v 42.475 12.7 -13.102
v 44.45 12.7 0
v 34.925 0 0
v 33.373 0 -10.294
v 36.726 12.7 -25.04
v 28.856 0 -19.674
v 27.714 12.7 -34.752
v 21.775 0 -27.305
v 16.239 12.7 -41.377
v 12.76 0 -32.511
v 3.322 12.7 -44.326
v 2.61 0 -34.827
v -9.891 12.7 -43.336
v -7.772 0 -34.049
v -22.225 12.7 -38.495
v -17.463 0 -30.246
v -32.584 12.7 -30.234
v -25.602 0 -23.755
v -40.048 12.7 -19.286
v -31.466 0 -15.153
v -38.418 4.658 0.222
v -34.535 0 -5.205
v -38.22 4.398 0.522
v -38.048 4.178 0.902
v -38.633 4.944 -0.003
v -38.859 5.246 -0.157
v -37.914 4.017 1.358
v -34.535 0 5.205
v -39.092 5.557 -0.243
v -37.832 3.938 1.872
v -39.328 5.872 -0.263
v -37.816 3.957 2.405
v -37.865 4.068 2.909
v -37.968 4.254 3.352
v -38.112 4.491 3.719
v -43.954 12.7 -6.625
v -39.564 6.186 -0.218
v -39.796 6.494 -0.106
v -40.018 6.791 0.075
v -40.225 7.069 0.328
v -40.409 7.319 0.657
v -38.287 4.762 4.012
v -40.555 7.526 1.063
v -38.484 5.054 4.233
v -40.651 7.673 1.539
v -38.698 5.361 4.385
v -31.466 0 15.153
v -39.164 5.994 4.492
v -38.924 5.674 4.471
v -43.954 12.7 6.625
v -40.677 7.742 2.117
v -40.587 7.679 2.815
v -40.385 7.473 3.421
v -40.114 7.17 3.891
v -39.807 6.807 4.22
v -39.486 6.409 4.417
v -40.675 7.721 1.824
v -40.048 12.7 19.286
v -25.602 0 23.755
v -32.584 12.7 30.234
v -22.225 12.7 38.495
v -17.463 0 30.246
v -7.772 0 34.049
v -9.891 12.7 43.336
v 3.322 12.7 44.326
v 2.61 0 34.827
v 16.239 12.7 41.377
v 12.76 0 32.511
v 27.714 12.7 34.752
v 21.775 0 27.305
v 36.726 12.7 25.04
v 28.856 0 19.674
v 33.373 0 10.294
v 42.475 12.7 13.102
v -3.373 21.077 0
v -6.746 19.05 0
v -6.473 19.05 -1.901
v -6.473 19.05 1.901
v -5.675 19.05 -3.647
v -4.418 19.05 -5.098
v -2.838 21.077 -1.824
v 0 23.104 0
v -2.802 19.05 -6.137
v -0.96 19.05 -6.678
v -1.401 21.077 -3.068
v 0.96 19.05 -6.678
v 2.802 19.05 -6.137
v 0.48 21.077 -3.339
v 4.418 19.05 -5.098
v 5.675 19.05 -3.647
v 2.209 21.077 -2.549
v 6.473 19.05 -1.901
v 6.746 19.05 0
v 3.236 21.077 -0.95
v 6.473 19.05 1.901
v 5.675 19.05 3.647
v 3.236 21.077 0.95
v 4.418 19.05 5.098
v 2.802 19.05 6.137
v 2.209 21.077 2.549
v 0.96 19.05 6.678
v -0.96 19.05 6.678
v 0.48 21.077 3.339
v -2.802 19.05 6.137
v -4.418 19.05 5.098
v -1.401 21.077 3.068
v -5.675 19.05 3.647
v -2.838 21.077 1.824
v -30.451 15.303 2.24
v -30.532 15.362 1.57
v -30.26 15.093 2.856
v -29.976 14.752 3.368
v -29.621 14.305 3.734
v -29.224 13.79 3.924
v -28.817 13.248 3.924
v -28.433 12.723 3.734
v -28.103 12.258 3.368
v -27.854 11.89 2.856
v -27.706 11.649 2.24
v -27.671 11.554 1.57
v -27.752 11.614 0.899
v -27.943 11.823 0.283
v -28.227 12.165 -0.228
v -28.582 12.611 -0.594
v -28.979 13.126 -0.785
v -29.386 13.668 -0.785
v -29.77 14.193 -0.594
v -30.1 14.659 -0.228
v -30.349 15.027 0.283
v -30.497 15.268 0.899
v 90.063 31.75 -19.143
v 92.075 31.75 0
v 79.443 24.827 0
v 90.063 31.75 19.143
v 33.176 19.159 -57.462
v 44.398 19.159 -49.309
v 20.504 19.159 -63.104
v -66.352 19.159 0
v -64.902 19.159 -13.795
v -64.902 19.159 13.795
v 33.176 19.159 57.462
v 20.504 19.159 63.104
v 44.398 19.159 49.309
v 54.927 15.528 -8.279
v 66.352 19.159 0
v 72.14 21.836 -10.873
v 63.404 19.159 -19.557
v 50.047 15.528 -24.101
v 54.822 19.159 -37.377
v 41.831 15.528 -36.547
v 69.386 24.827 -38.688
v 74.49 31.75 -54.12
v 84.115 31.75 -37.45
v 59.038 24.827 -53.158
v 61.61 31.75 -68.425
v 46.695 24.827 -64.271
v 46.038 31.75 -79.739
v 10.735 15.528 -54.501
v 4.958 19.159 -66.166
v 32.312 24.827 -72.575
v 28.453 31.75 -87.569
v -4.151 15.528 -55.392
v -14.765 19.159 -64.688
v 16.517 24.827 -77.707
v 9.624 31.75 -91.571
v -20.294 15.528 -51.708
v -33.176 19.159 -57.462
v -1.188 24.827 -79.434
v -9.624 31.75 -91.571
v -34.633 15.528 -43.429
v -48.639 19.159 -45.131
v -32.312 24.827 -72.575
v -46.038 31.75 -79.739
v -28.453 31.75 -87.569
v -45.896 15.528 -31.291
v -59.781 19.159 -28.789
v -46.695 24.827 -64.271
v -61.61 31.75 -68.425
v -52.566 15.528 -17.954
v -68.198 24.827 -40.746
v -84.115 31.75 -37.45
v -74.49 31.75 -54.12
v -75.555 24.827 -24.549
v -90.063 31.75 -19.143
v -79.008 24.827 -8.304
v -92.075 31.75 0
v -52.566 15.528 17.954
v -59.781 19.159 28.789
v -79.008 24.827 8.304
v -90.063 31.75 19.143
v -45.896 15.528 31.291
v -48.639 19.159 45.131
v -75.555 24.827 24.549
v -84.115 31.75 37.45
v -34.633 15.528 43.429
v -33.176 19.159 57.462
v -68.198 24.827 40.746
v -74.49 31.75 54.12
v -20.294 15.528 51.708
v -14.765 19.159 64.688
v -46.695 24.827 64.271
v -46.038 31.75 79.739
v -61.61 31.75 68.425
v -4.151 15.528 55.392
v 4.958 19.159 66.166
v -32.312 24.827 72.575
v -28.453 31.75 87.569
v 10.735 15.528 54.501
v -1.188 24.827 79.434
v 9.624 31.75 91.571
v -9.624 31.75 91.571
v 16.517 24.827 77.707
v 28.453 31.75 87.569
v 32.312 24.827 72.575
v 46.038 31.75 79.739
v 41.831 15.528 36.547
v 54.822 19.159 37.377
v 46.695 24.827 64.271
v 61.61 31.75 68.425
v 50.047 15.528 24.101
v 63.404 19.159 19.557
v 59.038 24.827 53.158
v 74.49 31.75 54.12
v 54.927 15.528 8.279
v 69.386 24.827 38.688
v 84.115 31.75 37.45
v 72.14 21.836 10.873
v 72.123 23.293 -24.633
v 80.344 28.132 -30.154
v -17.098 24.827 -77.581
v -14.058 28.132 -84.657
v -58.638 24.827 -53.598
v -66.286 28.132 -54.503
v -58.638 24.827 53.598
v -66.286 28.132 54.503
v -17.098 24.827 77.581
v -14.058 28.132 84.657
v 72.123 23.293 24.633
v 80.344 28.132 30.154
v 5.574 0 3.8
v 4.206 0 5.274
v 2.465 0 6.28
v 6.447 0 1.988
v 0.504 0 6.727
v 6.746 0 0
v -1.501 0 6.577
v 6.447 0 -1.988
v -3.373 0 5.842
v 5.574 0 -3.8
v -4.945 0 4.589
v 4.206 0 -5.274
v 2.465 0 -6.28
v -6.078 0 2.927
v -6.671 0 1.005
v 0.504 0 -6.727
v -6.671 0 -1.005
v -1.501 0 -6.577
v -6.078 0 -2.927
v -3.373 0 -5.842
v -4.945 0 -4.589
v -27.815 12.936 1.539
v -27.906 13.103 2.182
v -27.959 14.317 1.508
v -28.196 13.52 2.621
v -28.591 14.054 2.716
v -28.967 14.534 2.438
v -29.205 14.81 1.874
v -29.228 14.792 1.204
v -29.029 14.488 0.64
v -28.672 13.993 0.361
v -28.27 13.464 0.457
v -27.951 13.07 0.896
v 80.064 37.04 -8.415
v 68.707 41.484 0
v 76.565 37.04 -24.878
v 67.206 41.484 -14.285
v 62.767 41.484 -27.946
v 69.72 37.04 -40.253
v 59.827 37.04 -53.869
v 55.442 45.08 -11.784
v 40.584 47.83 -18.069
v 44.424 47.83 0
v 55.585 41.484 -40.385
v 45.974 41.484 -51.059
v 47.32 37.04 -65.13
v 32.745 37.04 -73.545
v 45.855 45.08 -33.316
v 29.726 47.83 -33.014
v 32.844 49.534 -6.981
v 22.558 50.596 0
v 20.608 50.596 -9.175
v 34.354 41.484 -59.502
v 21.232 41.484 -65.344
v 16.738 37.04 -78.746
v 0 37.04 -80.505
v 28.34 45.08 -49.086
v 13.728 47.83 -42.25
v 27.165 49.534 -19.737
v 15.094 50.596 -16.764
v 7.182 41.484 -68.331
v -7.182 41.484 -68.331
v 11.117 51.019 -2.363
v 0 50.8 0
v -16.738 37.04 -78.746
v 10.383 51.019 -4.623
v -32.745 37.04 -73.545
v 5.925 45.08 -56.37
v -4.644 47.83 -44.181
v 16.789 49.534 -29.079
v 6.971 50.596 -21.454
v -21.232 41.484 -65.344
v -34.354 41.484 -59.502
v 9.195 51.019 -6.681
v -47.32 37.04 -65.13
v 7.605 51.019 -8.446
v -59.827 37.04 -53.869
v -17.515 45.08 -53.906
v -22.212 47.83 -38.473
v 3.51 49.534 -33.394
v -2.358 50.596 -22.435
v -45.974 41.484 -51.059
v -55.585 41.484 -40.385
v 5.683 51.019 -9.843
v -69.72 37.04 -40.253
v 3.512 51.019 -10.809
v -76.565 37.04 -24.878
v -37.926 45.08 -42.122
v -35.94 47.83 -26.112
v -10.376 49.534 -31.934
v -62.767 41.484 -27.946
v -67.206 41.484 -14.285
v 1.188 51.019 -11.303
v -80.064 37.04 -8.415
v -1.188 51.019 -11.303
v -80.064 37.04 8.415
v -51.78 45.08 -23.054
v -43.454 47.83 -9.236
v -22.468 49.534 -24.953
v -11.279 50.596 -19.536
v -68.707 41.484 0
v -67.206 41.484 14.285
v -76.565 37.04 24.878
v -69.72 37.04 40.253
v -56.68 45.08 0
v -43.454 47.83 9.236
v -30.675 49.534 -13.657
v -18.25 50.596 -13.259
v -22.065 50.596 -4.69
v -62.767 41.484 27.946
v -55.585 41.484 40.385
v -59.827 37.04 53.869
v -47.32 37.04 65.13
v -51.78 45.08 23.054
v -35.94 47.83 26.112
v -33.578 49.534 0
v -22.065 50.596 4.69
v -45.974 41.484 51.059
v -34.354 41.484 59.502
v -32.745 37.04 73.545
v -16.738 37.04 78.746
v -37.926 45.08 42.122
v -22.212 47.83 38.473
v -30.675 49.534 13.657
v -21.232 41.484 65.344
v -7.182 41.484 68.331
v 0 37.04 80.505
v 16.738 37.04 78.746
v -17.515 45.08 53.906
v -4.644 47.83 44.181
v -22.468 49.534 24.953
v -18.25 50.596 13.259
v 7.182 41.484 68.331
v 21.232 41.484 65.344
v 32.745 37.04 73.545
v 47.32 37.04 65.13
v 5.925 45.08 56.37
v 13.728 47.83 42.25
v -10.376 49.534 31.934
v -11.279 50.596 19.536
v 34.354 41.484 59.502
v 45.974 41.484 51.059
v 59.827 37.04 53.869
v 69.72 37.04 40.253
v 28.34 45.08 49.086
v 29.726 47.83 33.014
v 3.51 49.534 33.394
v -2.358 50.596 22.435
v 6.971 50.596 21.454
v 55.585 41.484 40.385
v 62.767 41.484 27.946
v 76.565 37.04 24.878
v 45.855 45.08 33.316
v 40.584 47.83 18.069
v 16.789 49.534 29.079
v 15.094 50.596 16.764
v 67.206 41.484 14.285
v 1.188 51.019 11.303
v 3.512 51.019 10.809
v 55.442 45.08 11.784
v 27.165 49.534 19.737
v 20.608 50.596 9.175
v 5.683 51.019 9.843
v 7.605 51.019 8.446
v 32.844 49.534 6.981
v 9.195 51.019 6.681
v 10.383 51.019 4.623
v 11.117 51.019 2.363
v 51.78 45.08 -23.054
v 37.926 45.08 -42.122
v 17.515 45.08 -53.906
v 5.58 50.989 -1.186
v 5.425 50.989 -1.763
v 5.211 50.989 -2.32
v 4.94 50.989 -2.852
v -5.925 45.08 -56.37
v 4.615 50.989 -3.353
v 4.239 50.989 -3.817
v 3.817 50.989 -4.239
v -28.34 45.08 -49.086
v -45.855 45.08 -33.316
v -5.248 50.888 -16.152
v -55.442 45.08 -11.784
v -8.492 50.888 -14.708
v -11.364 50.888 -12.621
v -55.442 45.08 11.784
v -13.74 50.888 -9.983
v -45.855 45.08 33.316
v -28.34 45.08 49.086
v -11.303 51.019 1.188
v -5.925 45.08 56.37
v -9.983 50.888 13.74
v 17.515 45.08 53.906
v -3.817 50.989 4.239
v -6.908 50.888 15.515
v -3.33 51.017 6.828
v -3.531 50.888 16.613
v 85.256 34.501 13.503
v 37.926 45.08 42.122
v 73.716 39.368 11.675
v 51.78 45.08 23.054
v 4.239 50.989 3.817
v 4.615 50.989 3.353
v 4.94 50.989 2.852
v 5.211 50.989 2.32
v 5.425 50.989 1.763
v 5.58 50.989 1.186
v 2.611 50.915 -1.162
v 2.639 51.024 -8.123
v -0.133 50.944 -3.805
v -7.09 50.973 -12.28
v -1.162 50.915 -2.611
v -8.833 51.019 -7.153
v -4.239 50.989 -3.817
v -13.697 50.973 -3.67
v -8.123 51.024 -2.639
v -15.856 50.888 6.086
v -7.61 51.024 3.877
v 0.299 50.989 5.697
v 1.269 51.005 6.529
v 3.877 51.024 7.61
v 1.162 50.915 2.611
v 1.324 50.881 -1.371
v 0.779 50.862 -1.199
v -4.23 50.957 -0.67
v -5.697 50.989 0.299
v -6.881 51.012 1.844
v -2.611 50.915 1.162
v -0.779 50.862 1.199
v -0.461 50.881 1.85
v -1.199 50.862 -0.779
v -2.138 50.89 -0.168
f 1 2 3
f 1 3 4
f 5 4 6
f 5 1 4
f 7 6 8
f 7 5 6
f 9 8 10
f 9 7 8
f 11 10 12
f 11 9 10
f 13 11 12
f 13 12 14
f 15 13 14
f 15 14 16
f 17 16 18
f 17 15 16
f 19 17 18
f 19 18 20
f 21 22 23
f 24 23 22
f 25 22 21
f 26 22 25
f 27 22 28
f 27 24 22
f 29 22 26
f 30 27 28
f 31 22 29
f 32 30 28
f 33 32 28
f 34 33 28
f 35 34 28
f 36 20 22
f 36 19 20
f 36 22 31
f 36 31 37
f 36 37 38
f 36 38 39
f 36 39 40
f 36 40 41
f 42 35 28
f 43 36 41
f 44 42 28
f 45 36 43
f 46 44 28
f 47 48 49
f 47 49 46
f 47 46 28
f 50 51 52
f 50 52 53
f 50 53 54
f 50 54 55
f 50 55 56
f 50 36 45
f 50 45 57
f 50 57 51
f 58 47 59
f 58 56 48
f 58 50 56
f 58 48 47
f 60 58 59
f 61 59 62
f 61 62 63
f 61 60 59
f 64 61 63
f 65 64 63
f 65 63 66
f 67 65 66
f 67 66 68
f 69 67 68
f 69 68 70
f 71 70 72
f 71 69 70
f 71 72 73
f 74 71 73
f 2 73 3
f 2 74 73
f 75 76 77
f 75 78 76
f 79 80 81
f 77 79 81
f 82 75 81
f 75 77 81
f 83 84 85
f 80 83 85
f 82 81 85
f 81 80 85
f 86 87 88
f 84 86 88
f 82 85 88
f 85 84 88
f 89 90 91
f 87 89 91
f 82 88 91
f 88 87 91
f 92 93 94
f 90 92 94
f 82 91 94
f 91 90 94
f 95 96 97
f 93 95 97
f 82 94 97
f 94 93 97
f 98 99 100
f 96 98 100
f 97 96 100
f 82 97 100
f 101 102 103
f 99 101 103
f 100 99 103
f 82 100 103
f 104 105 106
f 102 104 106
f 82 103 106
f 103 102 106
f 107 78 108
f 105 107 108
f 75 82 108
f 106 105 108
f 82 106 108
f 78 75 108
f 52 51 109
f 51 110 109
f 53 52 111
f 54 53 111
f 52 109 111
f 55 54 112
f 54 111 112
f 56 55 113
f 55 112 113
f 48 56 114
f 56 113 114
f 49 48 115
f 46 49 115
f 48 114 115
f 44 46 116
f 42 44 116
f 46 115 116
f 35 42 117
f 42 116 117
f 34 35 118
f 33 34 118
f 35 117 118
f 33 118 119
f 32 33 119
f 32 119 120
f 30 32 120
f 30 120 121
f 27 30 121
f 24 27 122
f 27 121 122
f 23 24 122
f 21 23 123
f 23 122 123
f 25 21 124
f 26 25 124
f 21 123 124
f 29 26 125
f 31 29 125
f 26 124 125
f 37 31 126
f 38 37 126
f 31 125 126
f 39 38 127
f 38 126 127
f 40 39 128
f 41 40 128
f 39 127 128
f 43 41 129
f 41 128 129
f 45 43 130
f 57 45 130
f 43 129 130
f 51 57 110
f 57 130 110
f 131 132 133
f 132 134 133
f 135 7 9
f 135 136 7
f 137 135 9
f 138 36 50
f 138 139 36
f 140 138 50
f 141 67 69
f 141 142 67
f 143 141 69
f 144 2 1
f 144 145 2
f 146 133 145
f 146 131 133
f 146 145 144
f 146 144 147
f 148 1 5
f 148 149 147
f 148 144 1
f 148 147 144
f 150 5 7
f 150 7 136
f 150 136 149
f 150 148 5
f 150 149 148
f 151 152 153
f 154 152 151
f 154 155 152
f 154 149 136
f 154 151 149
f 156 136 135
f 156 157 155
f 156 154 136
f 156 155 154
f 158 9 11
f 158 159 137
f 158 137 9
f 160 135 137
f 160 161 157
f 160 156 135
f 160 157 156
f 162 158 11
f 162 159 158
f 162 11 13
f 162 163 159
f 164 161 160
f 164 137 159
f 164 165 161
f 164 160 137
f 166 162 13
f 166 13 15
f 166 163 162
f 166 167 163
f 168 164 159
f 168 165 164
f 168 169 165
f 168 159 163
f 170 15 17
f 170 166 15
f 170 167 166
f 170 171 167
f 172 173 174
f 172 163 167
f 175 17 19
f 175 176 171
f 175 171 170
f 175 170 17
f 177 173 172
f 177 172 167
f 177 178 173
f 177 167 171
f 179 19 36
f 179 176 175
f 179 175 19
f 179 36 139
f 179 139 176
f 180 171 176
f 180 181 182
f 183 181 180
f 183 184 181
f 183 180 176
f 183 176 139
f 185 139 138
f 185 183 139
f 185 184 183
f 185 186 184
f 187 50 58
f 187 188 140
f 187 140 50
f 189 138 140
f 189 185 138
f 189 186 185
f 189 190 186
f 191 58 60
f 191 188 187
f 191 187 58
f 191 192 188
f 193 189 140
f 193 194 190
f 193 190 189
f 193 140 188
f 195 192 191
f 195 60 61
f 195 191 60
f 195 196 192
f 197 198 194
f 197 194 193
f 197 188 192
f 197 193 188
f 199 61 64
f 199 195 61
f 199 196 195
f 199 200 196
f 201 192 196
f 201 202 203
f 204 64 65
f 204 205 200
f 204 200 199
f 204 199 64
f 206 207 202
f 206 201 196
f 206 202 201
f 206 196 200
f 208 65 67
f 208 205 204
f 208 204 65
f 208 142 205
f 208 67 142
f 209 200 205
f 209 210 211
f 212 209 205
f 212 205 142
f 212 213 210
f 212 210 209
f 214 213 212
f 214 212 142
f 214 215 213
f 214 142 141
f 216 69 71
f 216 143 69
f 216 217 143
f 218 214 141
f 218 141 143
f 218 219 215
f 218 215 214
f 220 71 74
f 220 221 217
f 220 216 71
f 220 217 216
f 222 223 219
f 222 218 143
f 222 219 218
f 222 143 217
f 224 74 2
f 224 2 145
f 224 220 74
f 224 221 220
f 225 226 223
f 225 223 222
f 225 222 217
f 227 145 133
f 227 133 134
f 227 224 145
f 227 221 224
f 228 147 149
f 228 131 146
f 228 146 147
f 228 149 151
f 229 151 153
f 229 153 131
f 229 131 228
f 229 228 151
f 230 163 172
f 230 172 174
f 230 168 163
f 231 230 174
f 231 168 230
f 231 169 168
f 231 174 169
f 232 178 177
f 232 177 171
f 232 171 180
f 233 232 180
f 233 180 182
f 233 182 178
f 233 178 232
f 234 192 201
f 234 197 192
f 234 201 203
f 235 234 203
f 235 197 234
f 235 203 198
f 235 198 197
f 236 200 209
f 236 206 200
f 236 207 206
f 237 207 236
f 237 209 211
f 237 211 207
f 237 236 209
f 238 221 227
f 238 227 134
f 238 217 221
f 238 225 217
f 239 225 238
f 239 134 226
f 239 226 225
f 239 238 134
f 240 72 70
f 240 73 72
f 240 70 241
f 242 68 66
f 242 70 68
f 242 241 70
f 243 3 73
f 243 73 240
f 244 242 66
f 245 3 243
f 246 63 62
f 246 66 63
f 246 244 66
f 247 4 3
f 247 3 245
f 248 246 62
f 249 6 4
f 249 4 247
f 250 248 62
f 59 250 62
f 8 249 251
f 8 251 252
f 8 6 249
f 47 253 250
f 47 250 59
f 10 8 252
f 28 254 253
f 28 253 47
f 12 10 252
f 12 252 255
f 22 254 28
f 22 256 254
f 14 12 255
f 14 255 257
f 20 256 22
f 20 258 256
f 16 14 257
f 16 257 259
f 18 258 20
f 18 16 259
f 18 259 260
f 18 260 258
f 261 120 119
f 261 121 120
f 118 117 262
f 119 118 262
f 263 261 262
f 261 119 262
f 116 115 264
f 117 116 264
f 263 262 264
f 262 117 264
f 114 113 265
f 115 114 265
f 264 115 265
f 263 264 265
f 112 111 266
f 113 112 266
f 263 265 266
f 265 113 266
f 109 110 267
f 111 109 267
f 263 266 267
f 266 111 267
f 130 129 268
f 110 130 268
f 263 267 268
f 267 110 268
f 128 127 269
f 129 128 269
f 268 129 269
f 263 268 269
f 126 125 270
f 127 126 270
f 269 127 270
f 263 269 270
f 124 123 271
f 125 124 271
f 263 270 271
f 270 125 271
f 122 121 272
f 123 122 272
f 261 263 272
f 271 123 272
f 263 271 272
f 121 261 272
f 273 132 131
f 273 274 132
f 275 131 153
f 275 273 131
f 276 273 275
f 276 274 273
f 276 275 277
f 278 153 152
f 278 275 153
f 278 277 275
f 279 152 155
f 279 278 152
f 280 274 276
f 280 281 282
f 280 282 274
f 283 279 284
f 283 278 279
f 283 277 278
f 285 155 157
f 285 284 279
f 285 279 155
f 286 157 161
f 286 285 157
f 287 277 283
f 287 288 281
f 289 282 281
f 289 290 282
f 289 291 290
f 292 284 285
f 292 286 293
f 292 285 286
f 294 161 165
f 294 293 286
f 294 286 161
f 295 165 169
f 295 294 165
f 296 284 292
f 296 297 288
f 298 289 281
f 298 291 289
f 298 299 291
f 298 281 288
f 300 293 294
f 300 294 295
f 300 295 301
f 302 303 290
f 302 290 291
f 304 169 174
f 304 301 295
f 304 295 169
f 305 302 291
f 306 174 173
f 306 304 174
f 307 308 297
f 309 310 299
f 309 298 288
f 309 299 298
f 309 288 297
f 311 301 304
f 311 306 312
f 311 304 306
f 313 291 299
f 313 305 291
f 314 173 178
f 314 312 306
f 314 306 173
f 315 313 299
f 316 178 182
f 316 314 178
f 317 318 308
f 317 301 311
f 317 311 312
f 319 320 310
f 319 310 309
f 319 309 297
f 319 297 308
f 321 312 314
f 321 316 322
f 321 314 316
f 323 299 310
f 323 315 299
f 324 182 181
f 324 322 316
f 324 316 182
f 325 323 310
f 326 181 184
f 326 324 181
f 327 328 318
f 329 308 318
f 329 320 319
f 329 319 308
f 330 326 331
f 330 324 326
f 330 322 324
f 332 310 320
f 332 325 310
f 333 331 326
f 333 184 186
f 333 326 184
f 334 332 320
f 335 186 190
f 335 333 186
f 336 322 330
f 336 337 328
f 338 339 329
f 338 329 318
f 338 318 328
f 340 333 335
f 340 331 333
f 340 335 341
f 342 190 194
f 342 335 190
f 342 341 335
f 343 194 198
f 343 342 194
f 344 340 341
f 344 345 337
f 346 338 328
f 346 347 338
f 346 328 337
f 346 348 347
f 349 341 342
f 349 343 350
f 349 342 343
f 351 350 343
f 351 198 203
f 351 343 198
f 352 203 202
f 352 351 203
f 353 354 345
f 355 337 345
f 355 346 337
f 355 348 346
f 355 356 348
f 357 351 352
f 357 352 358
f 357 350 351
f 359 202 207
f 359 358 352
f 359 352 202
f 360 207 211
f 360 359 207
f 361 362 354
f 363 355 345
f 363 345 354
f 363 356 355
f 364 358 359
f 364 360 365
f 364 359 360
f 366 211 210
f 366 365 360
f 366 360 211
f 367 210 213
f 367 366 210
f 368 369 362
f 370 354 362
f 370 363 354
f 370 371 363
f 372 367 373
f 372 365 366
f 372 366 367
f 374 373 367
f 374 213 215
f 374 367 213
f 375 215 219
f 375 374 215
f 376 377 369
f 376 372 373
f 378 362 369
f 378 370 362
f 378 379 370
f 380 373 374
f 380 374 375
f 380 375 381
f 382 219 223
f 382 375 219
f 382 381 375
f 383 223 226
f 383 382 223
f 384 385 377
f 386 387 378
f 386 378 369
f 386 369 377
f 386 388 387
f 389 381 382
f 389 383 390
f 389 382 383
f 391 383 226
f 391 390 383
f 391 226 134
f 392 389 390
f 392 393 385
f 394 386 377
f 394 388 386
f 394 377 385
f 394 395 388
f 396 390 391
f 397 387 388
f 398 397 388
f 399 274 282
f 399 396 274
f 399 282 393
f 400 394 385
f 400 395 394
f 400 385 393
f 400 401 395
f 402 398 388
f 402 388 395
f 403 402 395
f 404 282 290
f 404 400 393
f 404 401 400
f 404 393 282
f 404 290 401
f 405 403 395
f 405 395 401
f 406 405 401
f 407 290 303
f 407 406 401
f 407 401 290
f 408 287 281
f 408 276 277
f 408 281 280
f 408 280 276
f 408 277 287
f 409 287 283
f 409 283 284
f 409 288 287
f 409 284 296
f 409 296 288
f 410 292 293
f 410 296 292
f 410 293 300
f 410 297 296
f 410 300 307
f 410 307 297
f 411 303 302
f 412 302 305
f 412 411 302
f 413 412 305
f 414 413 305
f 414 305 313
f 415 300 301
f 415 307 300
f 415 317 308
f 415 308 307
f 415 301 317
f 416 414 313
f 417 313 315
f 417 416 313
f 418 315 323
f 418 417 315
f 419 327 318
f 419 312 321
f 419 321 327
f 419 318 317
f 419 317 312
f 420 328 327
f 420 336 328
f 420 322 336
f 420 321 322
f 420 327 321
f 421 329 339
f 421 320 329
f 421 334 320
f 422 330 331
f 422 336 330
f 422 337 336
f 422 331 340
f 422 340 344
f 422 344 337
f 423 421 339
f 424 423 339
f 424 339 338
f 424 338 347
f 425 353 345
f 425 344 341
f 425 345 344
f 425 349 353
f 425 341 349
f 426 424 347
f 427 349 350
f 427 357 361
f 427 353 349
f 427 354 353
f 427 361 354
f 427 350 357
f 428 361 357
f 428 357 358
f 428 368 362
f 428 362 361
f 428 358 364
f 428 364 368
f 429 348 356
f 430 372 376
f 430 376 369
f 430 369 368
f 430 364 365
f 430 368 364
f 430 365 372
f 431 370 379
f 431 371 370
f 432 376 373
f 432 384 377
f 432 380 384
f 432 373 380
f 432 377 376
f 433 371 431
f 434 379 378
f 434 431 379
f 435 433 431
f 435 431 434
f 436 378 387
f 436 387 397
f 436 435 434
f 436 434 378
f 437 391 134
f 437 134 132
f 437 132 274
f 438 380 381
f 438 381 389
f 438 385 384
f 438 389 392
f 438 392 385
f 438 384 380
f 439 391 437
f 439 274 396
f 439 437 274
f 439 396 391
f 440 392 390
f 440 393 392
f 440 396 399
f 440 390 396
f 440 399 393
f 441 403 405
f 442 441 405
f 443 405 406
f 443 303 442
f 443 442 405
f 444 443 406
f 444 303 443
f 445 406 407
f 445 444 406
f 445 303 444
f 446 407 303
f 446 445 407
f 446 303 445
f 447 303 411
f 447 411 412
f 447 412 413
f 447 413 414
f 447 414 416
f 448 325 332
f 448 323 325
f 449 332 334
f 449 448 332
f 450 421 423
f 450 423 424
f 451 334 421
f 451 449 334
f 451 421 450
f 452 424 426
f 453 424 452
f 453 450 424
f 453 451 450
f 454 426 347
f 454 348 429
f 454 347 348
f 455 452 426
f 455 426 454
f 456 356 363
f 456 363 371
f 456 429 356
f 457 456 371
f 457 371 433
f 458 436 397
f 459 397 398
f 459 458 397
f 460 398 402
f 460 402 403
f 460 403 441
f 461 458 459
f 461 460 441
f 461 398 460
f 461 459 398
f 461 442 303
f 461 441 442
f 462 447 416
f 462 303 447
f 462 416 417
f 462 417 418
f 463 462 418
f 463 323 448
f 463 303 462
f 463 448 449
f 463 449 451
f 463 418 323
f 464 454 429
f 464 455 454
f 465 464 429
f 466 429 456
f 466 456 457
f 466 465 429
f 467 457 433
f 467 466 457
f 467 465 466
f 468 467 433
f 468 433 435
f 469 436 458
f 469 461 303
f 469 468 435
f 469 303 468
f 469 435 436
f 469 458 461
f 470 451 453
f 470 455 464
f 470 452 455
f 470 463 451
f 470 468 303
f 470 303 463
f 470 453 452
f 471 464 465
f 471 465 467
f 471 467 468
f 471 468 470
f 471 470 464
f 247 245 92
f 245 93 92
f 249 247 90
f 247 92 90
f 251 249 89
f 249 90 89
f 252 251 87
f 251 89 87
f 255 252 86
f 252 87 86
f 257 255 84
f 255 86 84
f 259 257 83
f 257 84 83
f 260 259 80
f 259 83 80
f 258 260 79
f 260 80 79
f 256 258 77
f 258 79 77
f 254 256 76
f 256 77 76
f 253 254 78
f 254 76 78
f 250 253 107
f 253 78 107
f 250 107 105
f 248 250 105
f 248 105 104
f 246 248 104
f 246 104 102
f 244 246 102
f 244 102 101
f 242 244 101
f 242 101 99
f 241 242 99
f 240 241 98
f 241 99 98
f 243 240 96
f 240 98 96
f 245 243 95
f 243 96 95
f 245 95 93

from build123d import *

# Parameters (mm, degrees)
F_5_8_11_TAPPED_HOLE1_D            = 13.49248
F_5_8_11_TAPPED_HOLE1_DEPTH        = 19.05
F_5_8_11_TAPPED_HOLE1_TIP          = 4.053549943
F_3_16_0_1875_DIAMETER_HOLE1_D     = 4.7625
F_3_16_0_1875_DIAMETER_HOLE1_DEPTH = 12.7
F_3_16_0_1875_DIAMETER_HOLE1_TIP   = 1.430799349


with BuildPart() as part:
    # Sketch1 → Revolve1 (revolve)
    with BuildSketch(Plane.XY):
        with BuildLine():
            Line((0, 0), (34.925, 0))
            Line((34.925, 0), (44.45, 12.7))
            add(Edge.make_bspline(
                [(44.45, 12.7), (69.750610432, 18.159935057), (92.075, 31.75)],
                knots=[0, 0, 0, 1, 1, 1], degree=2))
            add(Edge.make_bspline(
                [(92.075, 31.75), (49.236918404, 53.116611797), (0, 50.8)],
                knots=[0, 0, 0, 1, 1, 1], degree=2))
            Line((0, 50.8), (0, 31.75))
            Line((0, 31.75), (0, 12.7))
            Line((0, 12.7), (0, 0))
        make_face()
    revolve(axis=Axis((0, 31.75, 0), (0, 1, 0)))

    # 5/8-11 Tapped Hole1
    with Locations(Plane(origin=(0, 0, 0), x_dir=(-1, 0, 0), z_dir=(0, -1, 0))):
        with Locations((0, 0)):
            Hole(F_5_8_11_TAPPED_HOLE1_D / 2, depth=F_5_8_11_TAPPED_HOLE1_DEPTH)
            with Locations((0, 0, -(F_5_8_11_TAPPED_HOLE1_DEPTH + F_5_8_11_TAPPED_HOLE1_TIP / 2))):  # 118° drill point
                Cone(0, F_5_8_11_TAPPED_HOLE1_D / 2, F_5_8_11_TAPPED_HOLE1_TIP, mode=Mode.SUBTRACT)

    # 3/16 (0.1875) Diameter Hole1
    with Locations(Plane(origin=(-39.246742436, 5.838388433, 2.116889387), x_dir=(0.600557743, -0.799581389, 0), z_dir=(-0.798838811, -0.6, 0.043087739))):
        with Locations((0, 0)):
            Hole(F_3_16_0_1875_DIAMETER_HOLE1_D / 2, depth=F_3_16_0_1875_DIAMETER_HOLE1_DEPTH)
            with Locations((0, 0, -(F_3_16_0_1875_DIAMETER_HOLE1_DEPTH + F_3_16_0_1875_DIAMETER_HOLE1_TIP / 2))):  # 118° drill point
                Cone(0, F_3_16_0_1875_DIAMETER_HOLE1_D / 2, F_3_16_0_1875_DIAMETER_HOLE1_TIP, mode=Mode.SUBTRACT)


solid = part.part
